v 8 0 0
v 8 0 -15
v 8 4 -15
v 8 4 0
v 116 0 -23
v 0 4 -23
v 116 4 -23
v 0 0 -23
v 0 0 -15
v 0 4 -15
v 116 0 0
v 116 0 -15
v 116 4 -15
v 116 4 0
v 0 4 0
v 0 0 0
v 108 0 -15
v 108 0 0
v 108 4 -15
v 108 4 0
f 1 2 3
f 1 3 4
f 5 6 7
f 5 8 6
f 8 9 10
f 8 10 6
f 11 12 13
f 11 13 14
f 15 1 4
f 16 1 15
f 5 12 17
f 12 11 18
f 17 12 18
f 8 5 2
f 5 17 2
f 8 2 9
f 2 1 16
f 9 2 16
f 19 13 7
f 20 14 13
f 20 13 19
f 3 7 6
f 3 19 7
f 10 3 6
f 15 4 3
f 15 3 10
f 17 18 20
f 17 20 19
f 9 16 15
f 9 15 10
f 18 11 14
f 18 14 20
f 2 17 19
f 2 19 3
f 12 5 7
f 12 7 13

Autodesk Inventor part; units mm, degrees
ref_plane "YZ Plane" through (0, 0, 0) normal (1, 0, 0) x (0, 1, 0)
ref_plane "XZ Plane" through (0, 0, 0) normal (0, 1, 0) x (-1, 0, 0)
ref_plane "XY Plane" through (0, 0, 0) normal (0, 0, 1) x (1, 0, 0)
sketch "Sketch1" plane through (0, 0, 0) normal (0, 1, 0) x (-1, 0, 0)
  line L0 (0, 0) -> (0, -15)
  line L1 (0, -15) -> (0, -23)
  line L2 (0, -23) -> (-116, -23)
  line L3 (-116, -23) -> (-116, -15)
  line L4 (-116, -15) -> (-116, 0)
  line L5 (-116, 0) -> (-108, 0)
  line L6 (-108, 0) -> (-108, -15)
  line L7 (-108, -15) -> (-8, -15)
  line L8 (-8, -15) -> (-8, 0)
  line L9 (-8, 0) -> (0, 0)
  dimension "d243" = 8
  dimension "d245" = 100
  dimension "d246" = 15
extrude "Extrusion1" add sketch "Sketch1" along normal blind 4
properties part number "Langbektang houder"
